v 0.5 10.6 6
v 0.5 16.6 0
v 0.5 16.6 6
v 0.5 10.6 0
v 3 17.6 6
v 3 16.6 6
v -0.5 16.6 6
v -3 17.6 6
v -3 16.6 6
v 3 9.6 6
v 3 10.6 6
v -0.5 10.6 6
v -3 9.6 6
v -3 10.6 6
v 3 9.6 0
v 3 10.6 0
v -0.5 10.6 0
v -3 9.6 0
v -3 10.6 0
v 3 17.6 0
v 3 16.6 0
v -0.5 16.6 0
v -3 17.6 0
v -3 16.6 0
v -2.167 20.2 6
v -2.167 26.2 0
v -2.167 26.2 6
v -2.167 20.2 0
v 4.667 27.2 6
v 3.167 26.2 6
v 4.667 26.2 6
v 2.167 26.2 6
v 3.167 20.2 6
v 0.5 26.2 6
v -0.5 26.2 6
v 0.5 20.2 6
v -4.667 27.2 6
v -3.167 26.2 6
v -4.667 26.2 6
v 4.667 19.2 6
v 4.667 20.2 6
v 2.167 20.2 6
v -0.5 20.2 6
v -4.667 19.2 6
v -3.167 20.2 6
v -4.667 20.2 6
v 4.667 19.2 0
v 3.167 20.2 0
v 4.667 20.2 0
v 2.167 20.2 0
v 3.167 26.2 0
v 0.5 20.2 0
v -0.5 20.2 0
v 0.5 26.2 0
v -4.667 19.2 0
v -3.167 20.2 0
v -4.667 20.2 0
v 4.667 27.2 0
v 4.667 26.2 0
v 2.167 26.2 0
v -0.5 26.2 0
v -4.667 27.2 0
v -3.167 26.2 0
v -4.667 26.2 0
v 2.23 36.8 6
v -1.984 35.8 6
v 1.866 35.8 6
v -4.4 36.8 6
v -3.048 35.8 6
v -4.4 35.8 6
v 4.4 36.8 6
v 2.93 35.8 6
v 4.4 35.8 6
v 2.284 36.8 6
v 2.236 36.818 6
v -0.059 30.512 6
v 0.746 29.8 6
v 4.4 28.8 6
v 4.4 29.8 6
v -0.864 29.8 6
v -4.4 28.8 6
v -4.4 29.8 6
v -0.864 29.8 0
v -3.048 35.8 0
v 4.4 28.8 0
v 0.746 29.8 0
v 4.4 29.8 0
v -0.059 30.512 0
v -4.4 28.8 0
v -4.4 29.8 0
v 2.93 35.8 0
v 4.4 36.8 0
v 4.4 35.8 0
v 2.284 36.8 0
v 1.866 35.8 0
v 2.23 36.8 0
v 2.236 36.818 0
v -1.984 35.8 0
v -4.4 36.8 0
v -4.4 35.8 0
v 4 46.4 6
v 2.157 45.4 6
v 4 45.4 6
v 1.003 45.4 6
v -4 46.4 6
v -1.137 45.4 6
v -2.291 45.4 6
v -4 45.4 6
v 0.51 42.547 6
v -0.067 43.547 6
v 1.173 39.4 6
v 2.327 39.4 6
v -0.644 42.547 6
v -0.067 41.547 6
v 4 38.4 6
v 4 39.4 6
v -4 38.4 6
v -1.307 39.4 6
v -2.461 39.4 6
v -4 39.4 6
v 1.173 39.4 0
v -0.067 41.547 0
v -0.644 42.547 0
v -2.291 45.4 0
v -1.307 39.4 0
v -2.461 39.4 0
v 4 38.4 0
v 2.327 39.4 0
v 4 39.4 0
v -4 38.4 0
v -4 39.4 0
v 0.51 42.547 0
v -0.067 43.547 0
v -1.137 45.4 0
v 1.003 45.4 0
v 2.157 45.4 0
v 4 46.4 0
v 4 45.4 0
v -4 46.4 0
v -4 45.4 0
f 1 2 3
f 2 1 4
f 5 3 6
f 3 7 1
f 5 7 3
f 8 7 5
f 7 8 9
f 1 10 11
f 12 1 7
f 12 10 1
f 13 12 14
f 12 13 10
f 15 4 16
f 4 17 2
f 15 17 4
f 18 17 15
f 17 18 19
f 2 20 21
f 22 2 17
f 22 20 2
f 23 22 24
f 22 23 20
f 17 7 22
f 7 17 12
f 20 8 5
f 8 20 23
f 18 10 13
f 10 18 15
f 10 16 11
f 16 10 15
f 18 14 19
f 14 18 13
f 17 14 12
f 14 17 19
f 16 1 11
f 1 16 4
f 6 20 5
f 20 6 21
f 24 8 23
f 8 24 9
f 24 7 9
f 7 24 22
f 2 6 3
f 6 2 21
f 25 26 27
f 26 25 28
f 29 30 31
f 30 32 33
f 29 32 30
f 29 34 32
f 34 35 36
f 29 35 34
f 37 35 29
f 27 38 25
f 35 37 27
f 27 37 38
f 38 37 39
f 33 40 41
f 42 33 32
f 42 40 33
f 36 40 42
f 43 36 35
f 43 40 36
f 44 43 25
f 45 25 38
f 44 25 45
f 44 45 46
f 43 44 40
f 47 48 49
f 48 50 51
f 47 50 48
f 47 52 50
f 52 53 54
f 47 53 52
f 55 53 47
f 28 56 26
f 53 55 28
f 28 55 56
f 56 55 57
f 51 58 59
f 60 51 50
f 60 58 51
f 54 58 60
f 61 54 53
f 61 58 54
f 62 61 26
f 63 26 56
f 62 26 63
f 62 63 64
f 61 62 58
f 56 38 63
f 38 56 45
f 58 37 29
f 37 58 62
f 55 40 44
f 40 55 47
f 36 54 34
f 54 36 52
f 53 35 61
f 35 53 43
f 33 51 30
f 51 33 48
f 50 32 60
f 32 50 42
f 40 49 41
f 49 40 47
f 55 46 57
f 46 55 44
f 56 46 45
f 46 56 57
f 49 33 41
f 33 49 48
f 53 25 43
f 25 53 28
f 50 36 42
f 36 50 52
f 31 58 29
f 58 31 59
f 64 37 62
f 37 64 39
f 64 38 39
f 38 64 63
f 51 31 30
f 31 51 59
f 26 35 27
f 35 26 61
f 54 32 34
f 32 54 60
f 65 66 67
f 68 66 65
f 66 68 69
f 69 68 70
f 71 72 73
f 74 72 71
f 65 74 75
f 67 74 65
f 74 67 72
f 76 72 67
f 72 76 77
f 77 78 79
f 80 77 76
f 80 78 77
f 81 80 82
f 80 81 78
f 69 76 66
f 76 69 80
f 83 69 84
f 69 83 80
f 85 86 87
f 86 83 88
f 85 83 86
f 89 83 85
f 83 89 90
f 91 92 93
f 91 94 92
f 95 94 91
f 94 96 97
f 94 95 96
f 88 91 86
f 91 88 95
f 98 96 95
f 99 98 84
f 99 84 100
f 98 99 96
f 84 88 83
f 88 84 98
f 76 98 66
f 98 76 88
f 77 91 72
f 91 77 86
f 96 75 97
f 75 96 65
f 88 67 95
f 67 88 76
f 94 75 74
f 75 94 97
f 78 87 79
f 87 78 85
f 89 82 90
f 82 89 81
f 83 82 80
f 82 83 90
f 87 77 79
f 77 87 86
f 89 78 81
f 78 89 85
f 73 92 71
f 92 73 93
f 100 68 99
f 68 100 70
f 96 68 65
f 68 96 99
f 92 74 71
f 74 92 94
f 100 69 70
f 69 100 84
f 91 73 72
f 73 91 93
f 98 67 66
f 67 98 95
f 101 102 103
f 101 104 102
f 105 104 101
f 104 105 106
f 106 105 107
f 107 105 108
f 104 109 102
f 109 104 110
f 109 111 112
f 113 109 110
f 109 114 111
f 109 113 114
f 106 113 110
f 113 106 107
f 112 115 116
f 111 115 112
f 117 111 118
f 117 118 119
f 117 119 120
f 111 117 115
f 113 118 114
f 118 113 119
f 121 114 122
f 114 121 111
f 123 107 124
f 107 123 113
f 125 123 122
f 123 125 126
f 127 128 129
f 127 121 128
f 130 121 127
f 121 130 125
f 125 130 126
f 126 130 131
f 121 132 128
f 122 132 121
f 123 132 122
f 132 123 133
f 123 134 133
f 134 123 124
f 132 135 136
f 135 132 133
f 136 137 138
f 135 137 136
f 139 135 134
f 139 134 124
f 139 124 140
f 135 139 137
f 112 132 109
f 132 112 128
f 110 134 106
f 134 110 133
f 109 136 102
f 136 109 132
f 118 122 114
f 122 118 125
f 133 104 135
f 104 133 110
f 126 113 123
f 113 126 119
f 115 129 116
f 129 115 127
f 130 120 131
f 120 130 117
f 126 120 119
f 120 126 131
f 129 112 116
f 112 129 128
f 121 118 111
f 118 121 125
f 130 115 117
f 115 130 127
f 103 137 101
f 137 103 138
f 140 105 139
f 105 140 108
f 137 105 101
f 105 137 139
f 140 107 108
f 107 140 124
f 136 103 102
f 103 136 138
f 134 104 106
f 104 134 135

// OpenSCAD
w=1;
h=8;
d=6;
s=h/2;
v_factor=2.2;
h_spacer=1.2 * h;
i_factor=1.5;

module risk1() {
	translate([-w/2,0,0])
	cube([w,h,d]);
	translate([-(i_factor*s)/2,0,0])
	cube([i_factor*s,w,d]);
	translate([-(i_factor*s)/2,h-w,0])
	cube([i_factor*s,w,d]);
}

module risk3() {
	for ( x =[-1, 0, 1 ]) {
		translate([(x*s/1.5)-w/2,0,0])
		cube([w,h,d]);
	}
	translate([-(s/2+(s/1.5)), 0, 0])
	cube([(s+(2*s/1.5)), w, d]);
	translate([-(s/2+(s/1.5)), h-w, 0])
	cube([(s+(2*s/1.5)), w, d]);
}


module risk5() {
	translate([-w/2,0,0])
	rotate([0,0,20])
	cube([w,h,d]);
	translate([-w/2,w/2,0])
	rotate([0,0,-20])
	cube([w,h,d]);
	translate([-(s*v_factor)/2,0,0])
	cube([s*v_factor,w,d]);
	translate([-(s*v_factor)/2,h-w,0])
	cube([s*v_factor,w,d]);
}

module risk10() {
	translate([s/2-w/4,0,0])
	rotate([0,0,30])
	cube([w,h*1.05,d]);
	translate([-s/2-3*w/4,w/2,0])
	rotate([0,0,-30])
	cube([w,h*1.05,d]);
	translate([-s,0,0])
	cube([s*2,w,d]);
	translate([-s,h-w,0])
	cube([s*2,w,d]);
}

translate([0,h_spacer,0])
risk1();

translate([0, 2*h_spacer,0])
risk3();

translate([0,3*h_spacer, 0])
risk5();

translate([0,4*h_spacer,0])
risk10();
